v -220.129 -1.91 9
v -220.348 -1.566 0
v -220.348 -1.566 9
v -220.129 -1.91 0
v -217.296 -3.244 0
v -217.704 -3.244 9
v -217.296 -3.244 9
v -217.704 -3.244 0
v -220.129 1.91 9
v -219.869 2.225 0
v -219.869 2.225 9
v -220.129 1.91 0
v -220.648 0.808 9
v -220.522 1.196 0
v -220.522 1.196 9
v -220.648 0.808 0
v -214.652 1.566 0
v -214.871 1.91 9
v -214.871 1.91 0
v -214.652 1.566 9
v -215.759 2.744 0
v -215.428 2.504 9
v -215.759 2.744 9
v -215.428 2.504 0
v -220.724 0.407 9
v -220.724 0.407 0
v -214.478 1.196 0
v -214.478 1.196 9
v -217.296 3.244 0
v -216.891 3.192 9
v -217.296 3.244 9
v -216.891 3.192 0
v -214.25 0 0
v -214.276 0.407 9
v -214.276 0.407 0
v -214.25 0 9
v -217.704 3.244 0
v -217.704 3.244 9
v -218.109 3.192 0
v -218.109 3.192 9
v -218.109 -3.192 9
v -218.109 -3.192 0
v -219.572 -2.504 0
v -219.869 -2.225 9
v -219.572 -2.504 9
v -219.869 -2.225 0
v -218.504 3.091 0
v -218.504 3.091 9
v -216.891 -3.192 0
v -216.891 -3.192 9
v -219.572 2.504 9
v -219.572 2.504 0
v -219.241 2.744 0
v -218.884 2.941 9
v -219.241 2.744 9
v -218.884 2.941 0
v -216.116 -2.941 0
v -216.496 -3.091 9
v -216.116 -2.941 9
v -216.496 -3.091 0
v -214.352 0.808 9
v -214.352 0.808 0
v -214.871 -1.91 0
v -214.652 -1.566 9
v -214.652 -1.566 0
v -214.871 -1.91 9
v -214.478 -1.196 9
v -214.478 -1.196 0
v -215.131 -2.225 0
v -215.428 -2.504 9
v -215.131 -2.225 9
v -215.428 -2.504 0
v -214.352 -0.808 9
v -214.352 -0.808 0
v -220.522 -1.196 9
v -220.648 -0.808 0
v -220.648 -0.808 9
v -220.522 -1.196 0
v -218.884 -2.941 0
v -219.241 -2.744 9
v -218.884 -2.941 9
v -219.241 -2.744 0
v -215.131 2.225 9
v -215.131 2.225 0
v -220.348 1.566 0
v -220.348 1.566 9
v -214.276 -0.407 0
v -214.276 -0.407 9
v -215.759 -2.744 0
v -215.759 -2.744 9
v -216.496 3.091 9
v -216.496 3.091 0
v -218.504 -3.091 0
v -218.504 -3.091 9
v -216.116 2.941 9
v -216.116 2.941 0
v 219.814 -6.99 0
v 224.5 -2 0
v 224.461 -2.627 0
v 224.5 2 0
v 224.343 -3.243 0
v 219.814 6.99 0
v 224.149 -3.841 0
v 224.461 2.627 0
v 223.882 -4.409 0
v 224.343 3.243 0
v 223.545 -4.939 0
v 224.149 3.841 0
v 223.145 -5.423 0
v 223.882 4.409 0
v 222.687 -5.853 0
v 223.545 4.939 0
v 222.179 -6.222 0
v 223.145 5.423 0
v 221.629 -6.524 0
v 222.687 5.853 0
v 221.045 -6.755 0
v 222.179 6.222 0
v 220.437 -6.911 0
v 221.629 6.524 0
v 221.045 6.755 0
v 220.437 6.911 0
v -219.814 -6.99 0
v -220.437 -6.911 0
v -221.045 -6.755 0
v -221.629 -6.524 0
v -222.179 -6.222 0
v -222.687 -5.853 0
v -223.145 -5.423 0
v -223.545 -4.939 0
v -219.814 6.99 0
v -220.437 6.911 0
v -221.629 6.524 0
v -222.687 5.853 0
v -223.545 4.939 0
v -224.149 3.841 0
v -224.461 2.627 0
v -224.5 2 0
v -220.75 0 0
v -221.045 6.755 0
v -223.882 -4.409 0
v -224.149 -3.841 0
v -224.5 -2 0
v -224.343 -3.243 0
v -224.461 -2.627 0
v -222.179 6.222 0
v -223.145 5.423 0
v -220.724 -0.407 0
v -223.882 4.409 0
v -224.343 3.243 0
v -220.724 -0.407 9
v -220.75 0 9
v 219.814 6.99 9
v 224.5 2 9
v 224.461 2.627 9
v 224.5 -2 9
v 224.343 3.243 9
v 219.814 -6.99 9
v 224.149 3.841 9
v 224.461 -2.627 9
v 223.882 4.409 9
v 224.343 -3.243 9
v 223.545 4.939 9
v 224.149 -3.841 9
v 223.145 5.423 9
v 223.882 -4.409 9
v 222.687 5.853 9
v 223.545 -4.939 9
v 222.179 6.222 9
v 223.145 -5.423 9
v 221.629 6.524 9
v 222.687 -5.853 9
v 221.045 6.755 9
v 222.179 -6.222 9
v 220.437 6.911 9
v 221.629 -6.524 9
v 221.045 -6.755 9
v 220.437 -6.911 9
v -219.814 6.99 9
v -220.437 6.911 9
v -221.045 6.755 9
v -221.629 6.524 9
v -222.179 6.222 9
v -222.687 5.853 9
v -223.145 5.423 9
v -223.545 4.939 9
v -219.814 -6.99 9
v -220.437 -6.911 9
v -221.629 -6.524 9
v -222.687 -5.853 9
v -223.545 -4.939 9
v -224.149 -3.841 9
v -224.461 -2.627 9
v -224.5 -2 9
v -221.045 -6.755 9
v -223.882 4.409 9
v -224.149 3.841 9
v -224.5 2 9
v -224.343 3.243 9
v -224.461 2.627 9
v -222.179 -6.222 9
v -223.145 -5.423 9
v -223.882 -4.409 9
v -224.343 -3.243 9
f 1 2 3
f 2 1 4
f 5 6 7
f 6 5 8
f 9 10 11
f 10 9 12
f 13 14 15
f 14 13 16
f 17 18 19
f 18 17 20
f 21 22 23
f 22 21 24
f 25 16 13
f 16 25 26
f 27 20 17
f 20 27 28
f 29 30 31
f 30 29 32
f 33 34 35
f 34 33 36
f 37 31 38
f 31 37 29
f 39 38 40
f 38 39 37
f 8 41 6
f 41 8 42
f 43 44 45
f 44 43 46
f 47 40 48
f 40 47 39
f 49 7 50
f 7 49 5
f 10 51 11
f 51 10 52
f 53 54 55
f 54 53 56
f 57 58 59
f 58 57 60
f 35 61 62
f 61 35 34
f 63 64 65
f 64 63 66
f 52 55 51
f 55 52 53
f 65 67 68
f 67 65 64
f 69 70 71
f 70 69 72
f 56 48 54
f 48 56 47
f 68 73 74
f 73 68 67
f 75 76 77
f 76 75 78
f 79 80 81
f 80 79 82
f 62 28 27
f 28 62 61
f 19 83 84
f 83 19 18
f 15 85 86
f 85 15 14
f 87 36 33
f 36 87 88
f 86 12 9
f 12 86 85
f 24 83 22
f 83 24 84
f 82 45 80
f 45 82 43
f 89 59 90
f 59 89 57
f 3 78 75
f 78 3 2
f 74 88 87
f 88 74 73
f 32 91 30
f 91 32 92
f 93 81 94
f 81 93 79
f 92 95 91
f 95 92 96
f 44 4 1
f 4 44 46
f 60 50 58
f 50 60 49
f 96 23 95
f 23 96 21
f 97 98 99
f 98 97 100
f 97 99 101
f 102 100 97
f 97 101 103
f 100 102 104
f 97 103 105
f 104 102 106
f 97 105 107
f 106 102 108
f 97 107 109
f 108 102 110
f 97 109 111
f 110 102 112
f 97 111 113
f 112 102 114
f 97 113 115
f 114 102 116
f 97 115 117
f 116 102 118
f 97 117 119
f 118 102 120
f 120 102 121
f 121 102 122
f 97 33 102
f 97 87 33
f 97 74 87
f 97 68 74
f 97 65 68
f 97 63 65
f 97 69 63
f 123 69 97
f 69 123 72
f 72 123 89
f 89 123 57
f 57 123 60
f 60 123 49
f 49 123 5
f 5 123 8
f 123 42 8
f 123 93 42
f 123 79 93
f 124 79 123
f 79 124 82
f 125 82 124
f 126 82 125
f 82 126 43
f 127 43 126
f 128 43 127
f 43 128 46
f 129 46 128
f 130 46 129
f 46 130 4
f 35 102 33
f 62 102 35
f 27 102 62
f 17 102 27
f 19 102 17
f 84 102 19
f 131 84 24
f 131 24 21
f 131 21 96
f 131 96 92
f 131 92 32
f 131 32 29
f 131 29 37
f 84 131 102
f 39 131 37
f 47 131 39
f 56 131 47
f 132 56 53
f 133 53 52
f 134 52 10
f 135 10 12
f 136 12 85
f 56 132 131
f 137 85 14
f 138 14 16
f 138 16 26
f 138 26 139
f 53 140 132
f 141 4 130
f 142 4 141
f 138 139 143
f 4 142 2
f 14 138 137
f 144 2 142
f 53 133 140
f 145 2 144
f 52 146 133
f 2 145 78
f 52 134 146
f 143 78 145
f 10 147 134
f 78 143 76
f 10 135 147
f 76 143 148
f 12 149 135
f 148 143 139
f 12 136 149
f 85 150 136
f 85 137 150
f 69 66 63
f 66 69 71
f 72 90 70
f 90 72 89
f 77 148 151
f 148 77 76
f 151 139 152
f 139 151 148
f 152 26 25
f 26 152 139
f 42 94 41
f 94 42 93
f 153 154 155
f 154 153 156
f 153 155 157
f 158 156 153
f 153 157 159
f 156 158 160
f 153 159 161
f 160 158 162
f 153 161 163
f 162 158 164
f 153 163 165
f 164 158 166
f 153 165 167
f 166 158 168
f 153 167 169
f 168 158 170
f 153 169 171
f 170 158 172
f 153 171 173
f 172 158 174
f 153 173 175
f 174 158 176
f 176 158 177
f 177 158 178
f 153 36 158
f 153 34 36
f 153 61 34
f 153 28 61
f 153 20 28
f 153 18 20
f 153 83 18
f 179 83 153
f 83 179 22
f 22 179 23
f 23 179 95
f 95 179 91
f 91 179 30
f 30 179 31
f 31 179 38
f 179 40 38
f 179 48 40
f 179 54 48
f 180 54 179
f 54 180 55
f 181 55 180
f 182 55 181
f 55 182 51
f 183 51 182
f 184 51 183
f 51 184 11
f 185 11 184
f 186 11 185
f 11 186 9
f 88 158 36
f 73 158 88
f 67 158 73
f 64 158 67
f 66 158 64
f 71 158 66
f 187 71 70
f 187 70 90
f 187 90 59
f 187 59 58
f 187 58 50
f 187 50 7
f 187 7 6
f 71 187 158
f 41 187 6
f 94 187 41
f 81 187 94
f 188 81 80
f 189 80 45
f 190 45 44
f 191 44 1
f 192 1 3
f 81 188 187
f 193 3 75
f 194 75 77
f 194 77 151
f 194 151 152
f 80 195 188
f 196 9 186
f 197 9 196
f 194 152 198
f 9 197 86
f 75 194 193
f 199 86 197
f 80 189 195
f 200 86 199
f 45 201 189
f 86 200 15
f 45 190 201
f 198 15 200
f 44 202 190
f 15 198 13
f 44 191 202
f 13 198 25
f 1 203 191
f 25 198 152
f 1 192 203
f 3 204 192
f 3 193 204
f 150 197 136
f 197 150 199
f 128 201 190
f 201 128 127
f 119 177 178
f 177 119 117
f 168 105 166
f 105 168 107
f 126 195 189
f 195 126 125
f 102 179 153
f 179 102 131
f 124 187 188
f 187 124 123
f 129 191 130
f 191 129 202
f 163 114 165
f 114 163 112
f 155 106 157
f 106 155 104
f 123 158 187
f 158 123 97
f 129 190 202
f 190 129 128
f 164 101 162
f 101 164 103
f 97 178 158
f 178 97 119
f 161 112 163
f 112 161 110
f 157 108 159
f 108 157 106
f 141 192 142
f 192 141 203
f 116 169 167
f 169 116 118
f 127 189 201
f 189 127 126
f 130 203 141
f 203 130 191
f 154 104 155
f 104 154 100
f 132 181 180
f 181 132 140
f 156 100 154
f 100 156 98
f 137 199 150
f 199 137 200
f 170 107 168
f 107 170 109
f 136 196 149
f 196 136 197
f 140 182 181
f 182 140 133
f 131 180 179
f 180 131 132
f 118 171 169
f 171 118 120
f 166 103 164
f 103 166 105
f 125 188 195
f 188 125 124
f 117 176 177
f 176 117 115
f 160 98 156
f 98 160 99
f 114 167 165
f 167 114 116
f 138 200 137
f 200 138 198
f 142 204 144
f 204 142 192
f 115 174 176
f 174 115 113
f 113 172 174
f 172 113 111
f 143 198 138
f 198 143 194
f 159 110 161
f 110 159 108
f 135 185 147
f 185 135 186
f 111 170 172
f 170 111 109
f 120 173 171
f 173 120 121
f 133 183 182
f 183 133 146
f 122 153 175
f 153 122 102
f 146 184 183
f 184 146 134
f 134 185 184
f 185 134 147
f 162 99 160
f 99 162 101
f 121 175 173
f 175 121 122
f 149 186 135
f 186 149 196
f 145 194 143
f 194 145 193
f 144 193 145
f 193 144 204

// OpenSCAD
$fn = 50;


difference() {
	union() {
		hull() {
			translate(v = [-219.5000000000, 2.0000000000, 0]) {
				cylinder(h = 9, r = 5);
			}
			translate(v = [219.5000000000, 2.0000000000, 0]) {
				cylinder(h = 9, r = 5);
			}
			translate(v = [-219.5000000000, -2.0000000000, 0]) {
				cylinder(h = 9, r = 5);
			}
			translate(v = [219.5000000000, -2.0000000000, 0]) {
				cylinder(h = 9, r = 5);
			}
		}
	}
	union() {
		translate(v = [-217.5000000000, 0.0000000000, 0]) {
			cylinder(h = 9, r = 3.2500000000);
		}
		translate(v = [-217.5000000000, 0.0000000000, 0]) {
			cylinder(h = 9, r = 1.8000000000);
		}
		translate(v = [-217.5000000000, 0.0000000000, 0]) {
			cylinder(h = 9, r = 1.8000000000);
		}
		translate(v = [-217.5000000000, 0.0000000000, 0]) {
			cylinder(h = 9, r = 1.8000000000);
		}
	}
}
